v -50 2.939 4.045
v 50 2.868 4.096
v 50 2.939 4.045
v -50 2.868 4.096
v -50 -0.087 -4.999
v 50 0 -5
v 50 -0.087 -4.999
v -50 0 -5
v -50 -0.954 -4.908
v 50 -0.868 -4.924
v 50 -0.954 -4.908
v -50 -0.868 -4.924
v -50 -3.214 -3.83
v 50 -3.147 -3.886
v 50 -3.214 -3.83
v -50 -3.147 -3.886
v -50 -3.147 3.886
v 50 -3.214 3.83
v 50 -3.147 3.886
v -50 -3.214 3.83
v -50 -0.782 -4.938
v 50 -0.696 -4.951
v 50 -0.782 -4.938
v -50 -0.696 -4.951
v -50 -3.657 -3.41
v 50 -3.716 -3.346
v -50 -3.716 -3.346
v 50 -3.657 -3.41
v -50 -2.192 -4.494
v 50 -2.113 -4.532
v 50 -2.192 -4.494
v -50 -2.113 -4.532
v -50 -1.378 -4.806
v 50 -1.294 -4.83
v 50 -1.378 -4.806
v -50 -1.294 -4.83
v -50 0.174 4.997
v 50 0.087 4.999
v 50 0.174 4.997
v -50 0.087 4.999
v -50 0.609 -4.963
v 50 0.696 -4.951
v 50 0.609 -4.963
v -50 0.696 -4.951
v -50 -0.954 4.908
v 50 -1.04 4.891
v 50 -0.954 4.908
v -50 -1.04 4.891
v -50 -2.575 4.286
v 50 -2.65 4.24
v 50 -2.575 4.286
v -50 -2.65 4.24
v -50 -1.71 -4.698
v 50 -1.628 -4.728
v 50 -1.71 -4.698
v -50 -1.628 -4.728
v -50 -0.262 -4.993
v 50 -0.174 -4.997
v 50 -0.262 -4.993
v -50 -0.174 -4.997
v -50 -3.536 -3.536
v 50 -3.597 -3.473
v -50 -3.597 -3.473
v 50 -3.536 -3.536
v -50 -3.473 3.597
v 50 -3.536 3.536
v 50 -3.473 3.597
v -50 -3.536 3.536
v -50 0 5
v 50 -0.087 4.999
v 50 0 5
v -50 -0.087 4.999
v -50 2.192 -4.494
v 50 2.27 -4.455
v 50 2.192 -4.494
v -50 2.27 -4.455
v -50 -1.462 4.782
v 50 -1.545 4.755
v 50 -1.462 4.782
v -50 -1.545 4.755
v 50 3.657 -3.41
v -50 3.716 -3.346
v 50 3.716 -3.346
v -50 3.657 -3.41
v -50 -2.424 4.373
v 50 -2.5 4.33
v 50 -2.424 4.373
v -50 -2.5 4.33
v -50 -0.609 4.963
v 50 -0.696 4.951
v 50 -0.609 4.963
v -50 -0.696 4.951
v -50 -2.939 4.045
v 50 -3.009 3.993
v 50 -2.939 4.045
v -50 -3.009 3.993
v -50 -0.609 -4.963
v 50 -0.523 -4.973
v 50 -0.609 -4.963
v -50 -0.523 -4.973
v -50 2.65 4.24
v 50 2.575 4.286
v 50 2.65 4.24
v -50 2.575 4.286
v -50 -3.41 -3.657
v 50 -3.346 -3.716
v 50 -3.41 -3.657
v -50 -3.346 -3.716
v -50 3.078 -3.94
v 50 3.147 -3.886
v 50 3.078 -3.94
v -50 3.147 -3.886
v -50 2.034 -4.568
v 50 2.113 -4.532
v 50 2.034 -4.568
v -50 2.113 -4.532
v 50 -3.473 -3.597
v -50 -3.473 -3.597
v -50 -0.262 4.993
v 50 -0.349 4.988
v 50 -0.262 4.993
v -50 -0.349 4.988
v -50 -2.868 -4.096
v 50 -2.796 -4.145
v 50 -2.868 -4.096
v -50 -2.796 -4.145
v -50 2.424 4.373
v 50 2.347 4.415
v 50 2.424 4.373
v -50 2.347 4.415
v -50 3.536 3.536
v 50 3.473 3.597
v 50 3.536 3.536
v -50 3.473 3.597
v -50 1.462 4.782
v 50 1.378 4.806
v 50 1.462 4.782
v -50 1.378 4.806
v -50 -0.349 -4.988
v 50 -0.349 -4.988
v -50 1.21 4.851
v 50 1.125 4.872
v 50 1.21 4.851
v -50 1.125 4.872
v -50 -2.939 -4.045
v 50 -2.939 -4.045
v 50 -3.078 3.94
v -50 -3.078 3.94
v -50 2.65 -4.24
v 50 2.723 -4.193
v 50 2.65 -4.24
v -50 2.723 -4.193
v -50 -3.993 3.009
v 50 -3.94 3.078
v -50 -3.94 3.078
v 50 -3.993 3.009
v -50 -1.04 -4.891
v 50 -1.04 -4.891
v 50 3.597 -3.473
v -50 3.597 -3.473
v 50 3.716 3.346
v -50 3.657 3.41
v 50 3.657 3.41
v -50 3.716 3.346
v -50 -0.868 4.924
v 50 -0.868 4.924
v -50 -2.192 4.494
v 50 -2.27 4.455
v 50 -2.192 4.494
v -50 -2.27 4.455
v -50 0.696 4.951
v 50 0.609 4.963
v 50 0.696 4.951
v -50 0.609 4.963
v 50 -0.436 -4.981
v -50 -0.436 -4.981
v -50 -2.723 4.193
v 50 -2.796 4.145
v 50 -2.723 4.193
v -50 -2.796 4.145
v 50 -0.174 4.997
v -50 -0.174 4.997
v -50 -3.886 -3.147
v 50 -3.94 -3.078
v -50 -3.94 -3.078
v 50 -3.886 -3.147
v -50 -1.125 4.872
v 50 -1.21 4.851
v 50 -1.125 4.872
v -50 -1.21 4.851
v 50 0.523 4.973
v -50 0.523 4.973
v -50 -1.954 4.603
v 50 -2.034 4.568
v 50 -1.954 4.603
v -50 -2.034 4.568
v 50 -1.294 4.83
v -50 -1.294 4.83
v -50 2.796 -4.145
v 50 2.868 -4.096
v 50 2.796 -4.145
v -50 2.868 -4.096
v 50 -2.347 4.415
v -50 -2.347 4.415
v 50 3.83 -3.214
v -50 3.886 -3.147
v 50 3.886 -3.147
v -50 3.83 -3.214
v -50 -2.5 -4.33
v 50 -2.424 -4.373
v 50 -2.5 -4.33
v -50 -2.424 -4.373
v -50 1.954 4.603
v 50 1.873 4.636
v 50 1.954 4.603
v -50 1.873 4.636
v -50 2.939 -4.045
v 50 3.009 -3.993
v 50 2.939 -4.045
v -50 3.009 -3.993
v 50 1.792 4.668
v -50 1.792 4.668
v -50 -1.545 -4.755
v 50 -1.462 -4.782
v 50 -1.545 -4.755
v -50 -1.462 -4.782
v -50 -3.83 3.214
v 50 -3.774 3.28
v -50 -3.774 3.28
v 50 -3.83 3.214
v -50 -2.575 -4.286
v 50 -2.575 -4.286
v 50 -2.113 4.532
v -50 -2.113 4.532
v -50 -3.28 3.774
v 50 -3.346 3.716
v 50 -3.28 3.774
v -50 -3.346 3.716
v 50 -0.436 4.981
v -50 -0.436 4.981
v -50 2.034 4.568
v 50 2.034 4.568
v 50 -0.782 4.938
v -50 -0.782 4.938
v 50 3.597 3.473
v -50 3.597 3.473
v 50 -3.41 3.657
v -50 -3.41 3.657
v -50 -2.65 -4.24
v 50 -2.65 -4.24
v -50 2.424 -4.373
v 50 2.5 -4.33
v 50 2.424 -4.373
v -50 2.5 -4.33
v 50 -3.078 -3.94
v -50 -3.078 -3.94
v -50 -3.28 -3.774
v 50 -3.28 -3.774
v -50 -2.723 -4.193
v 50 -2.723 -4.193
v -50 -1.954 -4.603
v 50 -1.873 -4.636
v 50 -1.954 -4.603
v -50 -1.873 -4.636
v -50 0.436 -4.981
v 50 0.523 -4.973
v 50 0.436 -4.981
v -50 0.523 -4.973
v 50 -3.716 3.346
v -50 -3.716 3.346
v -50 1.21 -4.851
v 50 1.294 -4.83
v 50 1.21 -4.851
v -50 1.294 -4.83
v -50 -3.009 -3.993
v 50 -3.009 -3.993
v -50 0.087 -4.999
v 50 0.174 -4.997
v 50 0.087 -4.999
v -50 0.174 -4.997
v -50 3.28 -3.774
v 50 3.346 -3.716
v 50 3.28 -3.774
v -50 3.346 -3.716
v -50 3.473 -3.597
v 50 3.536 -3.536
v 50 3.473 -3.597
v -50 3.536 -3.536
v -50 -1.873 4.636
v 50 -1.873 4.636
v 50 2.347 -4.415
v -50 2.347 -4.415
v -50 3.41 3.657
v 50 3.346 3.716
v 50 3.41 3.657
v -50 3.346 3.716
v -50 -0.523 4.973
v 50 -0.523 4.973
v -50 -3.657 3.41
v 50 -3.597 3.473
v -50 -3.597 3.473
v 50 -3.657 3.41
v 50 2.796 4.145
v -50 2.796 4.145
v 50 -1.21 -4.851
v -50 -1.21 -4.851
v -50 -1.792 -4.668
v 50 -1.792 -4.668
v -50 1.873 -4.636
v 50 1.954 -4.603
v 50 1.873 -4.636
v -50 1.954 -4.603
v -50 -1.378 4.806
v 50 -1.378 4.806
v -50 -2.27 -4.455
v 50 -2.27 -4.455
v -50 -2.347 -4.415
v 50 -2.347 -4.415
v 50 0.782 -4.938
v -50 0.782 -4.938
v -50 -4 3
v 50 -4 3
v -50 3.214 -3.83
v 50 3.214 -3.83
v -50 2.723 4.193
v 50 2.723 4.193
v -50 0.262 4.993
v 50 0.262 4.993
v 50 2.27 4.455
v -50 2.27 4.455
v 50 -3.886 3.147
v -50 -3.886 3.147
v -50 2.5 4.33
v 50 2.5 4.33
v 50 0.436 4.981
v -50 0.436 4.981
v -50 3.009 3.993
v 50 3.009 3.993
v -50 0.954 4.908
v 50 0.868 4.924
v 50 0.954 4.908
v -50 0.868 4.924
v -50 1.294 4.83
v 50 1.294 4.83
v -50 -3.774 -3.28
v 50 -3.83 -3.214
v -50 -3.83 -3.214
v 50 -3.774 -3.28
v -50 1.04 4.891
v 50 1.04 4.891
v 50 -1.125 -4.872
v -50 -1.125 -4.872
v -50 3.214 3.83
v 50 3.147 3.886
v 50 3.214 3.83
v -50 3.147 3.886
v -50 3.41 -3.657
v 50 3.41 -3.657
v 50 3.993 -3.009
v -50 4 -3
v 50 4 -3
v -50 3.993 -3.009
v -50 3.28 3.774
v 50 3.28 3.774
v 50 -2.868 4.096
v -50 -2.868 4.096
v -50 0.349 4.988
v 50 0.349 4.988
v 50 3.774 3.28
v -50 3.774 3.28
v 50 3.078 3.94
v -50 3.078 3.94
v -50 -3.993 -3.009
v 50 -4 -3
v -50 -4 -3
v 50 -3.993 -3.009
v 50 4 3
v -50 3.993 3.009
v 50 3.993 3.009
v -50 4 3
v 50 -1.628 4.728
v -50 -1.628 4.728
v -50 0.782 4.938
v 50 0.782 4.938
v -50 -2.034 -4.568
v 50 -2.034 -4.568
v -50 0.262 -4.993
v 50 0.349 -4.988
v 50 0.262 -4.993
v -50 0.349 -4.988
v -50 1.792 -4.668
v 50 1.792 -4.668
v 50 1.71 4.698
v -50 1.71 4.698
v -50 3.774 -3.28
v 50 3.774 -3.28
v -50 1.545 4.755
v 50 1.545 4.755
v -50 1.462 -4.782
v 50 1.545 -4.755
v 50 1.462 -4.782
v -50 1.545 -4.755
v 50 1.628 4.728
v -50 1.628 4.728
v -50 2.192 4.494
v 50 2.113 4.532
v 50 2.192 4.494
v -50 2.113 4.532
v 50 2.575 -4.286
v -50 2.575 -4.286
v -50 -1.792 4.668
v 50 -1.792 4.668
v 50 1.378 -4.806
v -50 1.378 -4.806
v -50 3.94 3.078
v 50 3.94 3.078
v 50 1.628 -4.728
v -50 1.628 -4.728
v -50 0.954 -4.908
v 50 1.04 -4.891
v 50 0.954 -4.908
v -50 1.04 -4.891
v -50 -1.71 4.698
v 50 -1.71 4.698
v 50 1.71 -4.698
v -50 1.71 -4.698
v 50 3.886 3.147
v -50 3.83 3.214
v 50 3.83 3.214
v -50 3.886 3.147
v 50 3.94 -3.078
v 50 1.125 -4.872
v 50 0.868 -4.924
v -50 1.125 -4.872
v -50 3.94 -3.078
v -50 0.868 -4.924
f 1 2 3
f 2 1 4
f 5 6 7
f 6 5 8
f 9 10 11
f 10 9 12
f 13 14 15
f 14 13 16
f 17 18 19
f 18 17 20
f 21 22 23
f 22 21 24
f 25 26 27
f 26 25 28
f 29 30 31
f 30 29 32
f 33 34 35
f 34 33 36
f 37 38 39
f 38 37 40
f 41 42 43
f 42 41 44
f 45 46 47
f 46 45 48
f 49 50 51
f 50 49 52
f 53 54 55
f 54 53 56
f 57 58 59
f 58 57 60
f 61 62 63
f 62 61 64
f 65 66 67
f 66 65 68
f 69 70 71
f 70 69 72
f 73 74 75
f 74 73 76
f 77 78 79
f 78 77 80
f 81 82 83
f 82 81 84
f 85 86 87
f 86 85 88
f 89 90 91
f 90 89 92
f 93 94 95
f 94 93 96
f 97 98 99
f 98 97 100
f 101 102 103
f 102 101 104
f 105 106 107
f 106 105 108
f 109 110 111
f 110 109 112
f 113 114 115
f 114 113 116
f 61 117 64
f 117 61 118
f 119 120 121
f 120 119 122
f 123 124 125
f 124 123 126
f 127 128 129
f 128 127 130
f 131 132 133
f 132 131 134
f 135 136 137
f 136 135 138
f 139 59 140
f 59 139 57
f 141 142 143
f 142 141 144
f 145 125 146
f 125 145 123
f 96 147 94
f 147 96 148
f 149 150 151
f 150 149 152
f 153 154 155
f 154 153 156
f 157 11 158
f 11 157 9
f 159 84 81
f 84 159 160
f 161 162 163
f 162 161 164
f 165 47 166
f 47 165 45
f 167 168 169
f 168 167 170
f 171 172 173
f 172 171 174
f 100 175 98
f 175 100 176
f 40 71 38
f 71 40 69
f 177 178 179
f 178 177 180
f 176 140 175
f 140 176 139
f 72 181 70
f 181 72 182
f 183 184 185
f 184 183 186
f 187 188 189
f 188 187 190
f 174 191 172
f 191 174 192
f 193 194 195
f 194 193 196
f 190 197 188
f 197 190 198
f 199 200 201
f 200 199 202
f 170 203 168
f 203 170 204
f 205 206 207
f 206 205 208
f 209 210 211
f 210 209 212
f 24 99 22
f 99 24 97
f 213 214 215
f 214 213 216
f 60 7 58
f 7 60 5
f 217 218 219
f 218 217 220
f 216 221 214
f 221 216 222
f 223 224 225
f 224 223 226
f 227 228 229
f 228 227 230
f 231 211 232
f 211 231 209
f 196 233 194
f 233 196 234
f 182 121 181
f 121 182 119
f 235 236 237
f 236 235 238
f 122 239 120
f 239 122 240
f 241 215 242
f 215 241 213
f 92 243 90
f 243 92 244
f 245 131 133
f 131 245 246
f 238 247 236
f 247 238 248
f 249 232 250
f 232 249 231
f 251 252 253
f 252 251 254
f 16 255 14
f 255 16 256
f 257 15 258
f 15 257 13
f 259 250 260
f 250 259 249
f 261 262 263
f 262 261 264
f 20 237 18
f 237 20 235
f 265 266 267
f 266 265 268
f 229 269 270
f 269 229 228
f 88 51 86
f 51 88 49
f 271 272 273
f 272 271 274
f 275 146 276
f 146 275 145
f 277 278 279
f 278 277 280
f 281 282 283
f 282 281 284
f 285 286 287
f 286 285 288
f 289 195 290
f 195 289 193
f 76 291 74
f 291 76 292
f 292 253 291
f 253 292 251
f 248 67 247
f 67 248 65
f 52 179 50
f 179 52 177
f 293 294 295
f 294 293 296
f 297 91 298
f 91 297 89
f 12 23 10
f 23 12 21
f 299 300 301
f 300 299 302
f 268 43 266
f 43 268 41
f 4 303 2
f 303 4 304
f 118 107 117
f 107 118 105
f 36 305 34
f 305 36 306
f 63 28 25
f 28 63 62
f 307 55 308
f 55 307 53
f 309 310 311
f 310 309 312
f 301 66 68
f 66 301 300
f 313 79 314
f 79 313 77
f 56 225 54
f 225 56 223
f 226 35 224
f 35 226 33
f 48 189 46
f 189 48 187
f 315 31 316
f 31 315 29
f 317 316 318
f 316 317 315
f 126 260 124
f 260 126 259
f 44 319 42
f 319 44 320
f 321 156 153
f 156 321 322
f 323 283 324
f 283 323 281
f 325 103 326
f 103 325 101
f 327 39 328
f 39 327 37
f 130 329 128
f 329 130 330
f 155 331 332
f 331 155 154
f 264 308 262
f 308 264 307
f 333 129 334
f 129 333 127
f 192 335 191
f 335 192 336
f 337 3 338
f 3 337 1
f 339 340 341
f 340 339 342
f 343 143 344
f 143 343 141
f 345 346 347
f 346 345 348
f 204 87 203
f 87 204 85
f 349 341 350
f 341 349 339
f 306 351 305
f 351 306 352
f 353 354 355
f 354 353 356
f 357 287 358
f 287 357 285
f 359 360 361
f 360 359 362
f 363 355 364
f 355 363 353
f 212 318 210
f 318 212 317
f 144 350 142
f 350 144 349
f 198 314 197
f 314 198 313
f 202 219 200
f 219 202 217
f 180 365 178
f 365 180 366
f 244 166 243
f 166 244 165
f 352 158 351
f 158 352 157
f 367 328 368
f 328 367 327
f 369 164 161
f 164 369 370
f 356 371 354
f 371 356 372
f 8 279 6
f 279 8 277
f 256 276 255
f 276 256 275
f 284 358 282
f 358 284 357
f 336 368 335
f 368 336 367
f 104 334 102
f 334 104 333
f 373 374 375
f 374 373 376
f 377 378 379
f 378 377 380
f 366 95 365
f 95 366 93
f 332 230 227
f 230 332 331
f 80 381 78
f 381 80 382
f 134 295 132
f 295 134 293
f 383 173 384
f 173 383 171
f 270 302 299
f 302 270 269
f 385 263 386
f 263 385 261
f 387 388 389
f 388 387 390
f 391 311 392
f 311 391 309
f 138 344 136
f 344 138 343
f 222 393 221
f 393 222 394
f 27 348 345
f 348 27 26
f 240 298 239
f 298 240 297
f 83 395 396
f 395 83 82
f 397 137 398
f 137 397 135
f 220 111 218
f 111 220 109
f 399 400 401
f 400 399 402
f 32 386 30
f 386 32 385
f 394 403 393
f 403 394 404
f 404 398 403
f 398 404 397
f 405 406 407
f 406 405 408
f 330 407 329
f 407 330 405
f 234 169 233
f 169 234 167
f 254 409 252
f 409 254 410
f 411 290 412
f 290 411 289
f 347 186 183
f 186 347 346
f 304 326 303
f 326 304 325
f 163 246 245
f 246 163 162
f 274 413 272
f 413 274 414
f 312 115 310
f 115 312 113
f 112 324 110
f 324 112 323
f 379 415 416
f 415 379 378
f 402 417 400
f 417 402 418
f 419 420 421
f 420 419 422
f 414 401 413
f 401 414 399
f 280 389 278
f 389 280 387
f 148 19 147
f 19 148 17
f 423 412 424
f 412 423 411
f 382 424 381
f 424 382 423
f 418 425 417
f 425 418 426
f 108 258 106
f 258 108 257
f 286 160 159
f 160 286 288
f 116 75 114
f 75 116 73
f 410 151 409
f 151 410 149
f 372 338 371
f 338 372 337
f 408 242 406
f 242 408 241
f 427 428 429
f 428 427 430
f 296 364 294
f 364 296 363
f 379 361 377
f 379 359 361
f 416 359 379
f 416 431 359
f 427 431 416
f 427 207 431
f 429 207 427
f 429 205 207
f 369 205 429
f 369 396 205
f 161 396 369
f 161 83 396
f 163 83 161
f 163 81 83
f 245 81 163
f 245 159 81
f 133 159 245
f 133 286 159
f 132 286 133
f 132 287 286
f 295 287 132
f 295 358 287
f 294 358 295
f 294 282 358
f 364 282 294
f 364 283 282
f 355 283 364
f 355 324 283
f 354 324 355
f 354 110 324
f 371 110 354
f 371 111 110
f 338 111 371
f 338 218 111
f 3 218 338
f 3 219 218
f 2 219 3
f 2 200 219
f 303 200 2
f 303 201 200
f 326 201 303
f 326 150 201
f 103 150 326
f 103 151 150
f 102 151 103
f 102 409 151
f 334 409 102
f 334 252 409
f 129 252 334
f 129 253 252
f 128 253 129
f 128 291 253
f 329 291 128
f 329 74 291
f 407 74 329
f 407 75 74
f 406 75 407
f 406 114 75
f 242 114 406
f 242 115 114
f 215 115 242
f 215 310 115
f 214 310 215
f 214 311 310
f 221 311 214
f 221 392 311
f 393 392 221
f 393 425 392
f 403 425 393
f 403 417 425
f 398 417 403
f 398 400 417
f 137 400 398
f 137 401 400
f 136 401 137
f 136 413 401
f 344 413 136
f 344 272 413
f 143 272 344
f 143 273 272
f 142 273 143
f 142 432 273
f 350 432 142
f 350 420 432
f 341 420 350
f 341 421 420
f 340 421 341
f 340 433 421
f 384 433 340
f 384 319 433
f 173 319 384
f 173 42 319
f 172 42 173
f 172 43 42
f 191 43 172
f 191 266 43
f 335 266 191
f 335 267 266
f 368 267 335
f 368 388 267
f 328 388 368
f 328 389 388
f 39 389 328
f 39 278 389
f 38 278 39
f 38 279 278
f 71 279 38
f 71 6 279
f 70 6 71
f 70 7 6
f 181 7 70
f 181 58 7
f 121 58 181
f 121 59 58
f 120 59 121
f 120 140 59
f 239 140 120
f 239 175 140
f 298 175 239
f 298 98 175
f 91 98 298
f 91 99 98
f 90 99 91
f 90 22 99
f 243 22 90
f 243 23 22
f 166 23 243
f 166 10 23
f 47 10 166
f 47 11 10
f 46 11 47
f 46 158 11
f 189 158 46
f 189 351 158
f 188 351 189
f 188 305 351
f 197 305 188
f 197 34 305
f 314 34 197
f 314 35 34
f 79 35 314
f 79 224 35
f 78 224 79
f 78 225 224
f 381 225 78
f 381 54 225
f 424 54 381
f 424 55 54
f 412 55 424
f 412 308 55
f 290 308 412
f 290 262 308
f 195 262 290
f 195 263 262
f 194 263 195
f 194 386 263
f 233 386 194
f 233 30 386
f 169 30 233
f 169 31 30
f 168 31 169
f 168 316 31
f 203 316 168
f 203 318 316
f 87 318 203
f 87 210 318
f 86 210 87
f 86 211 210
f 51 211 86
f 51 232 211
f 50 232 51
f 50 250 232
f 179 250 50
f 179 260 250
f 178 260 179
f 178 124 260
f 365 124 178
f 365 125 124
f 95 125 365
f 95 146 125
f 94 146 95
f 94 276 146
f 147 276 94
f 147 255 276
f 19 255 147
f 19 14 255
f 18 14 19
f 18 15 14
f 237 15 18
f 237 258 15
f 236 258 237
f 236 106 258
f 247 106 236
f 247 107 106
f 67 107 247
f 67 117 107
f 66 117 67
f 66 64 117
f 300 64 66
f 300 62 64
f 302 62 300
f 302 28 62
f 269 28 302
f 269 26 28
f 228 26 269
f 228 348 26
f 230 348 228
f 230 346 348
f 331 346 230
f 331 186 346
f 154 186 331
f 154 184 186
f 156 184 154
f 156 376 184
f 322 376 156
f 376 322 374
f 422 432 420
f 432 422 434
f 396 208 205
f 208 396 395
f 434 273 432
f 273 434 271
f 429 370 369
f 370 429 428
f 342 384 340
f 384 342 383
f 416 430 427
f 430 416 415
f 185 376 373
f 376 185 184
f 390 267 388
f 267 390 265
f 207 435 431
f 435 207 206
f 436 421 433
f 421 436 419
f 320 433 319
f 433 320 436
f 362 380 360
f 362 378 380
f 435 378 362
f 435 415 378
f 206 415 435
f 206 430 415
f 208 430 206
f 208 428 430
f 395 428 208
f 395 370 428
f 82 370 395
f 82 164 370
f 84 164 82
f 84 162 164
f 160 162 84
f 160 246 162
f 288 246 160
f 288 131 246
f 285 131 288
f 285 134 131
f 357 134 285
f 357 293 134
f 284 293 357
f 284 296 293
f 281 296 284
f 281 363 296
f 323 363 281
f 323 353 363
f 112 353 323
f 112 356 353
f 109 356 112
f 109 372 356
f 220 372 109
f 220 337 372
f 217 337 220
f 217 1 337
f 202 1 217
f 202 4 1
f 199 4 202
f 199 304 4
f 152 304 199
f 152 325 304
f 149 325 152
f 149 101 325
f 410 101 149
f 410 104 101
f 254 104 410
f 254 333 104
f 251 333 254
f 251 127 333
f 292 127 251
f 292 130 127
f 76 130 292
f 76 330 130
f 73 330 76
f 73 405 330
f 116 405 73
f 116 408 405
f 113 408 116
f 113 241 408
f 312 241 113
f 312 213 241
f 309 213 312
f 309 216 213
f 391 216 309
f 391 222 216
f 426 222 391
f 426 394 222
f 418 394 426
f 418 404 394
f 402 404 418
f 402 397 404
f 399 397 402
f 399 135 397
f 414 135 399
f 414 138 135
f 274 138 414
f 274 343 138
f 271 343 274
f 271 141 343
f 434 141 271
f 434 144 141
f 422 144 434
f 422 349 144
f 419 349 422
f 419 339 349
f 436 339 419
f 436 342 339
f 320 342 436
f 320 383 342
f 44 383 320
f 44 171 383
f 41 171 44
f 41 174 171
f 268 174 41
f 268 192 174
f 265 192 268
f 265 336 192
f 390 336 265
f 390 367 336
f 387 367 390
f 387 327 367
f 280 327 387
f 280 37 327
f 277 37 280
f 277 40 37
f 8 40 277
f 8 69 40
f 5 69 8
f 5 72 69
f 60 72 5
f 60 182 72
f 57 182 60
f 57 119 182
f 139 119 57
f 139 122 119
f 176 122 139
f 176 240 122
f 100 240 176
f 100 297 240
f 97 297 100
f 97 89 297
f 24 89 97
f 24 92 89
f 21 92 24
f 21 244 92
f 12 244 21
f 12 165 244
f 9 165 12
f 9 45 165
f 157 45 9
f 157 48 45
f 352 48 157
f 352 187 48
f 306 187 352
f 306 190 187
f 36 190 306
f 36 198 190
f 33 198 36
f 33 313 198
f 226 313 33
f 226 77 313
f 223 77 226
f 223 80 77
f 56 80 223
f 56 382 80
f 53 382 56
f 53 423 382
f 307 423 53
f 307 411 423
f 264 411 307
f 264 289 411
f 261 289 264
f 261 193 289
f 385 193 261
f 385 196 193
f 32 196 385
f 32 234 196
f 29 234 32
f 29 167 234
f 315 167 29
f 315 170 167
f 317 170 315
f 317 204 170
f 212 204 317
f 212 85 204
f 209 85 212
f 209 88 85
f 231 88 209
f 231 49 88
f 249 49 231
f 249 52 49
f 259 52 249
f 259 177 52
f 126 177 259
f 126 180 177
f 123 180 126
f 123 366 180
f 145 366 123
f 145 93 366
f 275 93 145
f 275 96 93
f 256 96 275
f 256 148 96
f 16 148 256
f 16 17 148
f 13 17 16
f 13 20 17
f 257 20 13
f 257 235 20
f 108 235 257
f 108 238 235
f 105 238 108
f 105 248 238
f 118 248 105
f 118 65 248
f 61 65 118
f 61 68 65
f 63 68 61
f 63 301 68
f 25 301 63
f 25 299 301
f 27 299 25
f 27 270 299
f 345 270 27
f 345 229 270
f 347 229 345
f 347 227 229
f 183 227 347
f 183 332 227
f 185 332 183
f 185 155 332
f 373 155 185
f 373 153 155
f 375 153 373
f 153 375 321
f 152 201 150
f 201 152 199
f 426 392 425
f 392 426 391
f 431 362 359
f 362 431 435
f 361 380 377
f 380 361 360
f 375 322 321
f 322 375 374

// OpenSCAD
function mm(x) = x;

module ferriteRod(length, diameter) {
	color("#000000")
		rotate([0, 90, 0])
		difference() {
			radius = diameter / 2;
			translate([0, 0, -length / 2])
				linear_extrude(length)
				circle(d=diameter, $fn=360);

			translate([0, radius, 0])
				cube([diameter, mm(2), length + 1], center=true);

			translate([0, -radius, 0])
				cube([diameter, mm(2), length + 1], center=true);
		}
}

module copperLoop(loopDiameter, wireDiameter) {
	color("#f7703b")
		rotate([0, 90, 0])
		rotate_extrude(convexity=10, $fn=10)
		translate([loopDiameter / 2 + wireDiameter, 0, 0])
			circle(r=wireDiameter, $fn=10);
}

module copperLoops(turns) {
	wireDiameter = mm(0.5);
	halfLength = wireDiameter * (turns / 2);
	for (x = [-halfLength : wireDiameter : halfLength]) {
		translate([x, 0, 0])
			copperLoop(loopDiameter=mm(10), wireDiameter=wireDiameter);
	}
}

ferriteRod(length=mm(100), diameter=mm(10));
//copperLoops(turns=164);
